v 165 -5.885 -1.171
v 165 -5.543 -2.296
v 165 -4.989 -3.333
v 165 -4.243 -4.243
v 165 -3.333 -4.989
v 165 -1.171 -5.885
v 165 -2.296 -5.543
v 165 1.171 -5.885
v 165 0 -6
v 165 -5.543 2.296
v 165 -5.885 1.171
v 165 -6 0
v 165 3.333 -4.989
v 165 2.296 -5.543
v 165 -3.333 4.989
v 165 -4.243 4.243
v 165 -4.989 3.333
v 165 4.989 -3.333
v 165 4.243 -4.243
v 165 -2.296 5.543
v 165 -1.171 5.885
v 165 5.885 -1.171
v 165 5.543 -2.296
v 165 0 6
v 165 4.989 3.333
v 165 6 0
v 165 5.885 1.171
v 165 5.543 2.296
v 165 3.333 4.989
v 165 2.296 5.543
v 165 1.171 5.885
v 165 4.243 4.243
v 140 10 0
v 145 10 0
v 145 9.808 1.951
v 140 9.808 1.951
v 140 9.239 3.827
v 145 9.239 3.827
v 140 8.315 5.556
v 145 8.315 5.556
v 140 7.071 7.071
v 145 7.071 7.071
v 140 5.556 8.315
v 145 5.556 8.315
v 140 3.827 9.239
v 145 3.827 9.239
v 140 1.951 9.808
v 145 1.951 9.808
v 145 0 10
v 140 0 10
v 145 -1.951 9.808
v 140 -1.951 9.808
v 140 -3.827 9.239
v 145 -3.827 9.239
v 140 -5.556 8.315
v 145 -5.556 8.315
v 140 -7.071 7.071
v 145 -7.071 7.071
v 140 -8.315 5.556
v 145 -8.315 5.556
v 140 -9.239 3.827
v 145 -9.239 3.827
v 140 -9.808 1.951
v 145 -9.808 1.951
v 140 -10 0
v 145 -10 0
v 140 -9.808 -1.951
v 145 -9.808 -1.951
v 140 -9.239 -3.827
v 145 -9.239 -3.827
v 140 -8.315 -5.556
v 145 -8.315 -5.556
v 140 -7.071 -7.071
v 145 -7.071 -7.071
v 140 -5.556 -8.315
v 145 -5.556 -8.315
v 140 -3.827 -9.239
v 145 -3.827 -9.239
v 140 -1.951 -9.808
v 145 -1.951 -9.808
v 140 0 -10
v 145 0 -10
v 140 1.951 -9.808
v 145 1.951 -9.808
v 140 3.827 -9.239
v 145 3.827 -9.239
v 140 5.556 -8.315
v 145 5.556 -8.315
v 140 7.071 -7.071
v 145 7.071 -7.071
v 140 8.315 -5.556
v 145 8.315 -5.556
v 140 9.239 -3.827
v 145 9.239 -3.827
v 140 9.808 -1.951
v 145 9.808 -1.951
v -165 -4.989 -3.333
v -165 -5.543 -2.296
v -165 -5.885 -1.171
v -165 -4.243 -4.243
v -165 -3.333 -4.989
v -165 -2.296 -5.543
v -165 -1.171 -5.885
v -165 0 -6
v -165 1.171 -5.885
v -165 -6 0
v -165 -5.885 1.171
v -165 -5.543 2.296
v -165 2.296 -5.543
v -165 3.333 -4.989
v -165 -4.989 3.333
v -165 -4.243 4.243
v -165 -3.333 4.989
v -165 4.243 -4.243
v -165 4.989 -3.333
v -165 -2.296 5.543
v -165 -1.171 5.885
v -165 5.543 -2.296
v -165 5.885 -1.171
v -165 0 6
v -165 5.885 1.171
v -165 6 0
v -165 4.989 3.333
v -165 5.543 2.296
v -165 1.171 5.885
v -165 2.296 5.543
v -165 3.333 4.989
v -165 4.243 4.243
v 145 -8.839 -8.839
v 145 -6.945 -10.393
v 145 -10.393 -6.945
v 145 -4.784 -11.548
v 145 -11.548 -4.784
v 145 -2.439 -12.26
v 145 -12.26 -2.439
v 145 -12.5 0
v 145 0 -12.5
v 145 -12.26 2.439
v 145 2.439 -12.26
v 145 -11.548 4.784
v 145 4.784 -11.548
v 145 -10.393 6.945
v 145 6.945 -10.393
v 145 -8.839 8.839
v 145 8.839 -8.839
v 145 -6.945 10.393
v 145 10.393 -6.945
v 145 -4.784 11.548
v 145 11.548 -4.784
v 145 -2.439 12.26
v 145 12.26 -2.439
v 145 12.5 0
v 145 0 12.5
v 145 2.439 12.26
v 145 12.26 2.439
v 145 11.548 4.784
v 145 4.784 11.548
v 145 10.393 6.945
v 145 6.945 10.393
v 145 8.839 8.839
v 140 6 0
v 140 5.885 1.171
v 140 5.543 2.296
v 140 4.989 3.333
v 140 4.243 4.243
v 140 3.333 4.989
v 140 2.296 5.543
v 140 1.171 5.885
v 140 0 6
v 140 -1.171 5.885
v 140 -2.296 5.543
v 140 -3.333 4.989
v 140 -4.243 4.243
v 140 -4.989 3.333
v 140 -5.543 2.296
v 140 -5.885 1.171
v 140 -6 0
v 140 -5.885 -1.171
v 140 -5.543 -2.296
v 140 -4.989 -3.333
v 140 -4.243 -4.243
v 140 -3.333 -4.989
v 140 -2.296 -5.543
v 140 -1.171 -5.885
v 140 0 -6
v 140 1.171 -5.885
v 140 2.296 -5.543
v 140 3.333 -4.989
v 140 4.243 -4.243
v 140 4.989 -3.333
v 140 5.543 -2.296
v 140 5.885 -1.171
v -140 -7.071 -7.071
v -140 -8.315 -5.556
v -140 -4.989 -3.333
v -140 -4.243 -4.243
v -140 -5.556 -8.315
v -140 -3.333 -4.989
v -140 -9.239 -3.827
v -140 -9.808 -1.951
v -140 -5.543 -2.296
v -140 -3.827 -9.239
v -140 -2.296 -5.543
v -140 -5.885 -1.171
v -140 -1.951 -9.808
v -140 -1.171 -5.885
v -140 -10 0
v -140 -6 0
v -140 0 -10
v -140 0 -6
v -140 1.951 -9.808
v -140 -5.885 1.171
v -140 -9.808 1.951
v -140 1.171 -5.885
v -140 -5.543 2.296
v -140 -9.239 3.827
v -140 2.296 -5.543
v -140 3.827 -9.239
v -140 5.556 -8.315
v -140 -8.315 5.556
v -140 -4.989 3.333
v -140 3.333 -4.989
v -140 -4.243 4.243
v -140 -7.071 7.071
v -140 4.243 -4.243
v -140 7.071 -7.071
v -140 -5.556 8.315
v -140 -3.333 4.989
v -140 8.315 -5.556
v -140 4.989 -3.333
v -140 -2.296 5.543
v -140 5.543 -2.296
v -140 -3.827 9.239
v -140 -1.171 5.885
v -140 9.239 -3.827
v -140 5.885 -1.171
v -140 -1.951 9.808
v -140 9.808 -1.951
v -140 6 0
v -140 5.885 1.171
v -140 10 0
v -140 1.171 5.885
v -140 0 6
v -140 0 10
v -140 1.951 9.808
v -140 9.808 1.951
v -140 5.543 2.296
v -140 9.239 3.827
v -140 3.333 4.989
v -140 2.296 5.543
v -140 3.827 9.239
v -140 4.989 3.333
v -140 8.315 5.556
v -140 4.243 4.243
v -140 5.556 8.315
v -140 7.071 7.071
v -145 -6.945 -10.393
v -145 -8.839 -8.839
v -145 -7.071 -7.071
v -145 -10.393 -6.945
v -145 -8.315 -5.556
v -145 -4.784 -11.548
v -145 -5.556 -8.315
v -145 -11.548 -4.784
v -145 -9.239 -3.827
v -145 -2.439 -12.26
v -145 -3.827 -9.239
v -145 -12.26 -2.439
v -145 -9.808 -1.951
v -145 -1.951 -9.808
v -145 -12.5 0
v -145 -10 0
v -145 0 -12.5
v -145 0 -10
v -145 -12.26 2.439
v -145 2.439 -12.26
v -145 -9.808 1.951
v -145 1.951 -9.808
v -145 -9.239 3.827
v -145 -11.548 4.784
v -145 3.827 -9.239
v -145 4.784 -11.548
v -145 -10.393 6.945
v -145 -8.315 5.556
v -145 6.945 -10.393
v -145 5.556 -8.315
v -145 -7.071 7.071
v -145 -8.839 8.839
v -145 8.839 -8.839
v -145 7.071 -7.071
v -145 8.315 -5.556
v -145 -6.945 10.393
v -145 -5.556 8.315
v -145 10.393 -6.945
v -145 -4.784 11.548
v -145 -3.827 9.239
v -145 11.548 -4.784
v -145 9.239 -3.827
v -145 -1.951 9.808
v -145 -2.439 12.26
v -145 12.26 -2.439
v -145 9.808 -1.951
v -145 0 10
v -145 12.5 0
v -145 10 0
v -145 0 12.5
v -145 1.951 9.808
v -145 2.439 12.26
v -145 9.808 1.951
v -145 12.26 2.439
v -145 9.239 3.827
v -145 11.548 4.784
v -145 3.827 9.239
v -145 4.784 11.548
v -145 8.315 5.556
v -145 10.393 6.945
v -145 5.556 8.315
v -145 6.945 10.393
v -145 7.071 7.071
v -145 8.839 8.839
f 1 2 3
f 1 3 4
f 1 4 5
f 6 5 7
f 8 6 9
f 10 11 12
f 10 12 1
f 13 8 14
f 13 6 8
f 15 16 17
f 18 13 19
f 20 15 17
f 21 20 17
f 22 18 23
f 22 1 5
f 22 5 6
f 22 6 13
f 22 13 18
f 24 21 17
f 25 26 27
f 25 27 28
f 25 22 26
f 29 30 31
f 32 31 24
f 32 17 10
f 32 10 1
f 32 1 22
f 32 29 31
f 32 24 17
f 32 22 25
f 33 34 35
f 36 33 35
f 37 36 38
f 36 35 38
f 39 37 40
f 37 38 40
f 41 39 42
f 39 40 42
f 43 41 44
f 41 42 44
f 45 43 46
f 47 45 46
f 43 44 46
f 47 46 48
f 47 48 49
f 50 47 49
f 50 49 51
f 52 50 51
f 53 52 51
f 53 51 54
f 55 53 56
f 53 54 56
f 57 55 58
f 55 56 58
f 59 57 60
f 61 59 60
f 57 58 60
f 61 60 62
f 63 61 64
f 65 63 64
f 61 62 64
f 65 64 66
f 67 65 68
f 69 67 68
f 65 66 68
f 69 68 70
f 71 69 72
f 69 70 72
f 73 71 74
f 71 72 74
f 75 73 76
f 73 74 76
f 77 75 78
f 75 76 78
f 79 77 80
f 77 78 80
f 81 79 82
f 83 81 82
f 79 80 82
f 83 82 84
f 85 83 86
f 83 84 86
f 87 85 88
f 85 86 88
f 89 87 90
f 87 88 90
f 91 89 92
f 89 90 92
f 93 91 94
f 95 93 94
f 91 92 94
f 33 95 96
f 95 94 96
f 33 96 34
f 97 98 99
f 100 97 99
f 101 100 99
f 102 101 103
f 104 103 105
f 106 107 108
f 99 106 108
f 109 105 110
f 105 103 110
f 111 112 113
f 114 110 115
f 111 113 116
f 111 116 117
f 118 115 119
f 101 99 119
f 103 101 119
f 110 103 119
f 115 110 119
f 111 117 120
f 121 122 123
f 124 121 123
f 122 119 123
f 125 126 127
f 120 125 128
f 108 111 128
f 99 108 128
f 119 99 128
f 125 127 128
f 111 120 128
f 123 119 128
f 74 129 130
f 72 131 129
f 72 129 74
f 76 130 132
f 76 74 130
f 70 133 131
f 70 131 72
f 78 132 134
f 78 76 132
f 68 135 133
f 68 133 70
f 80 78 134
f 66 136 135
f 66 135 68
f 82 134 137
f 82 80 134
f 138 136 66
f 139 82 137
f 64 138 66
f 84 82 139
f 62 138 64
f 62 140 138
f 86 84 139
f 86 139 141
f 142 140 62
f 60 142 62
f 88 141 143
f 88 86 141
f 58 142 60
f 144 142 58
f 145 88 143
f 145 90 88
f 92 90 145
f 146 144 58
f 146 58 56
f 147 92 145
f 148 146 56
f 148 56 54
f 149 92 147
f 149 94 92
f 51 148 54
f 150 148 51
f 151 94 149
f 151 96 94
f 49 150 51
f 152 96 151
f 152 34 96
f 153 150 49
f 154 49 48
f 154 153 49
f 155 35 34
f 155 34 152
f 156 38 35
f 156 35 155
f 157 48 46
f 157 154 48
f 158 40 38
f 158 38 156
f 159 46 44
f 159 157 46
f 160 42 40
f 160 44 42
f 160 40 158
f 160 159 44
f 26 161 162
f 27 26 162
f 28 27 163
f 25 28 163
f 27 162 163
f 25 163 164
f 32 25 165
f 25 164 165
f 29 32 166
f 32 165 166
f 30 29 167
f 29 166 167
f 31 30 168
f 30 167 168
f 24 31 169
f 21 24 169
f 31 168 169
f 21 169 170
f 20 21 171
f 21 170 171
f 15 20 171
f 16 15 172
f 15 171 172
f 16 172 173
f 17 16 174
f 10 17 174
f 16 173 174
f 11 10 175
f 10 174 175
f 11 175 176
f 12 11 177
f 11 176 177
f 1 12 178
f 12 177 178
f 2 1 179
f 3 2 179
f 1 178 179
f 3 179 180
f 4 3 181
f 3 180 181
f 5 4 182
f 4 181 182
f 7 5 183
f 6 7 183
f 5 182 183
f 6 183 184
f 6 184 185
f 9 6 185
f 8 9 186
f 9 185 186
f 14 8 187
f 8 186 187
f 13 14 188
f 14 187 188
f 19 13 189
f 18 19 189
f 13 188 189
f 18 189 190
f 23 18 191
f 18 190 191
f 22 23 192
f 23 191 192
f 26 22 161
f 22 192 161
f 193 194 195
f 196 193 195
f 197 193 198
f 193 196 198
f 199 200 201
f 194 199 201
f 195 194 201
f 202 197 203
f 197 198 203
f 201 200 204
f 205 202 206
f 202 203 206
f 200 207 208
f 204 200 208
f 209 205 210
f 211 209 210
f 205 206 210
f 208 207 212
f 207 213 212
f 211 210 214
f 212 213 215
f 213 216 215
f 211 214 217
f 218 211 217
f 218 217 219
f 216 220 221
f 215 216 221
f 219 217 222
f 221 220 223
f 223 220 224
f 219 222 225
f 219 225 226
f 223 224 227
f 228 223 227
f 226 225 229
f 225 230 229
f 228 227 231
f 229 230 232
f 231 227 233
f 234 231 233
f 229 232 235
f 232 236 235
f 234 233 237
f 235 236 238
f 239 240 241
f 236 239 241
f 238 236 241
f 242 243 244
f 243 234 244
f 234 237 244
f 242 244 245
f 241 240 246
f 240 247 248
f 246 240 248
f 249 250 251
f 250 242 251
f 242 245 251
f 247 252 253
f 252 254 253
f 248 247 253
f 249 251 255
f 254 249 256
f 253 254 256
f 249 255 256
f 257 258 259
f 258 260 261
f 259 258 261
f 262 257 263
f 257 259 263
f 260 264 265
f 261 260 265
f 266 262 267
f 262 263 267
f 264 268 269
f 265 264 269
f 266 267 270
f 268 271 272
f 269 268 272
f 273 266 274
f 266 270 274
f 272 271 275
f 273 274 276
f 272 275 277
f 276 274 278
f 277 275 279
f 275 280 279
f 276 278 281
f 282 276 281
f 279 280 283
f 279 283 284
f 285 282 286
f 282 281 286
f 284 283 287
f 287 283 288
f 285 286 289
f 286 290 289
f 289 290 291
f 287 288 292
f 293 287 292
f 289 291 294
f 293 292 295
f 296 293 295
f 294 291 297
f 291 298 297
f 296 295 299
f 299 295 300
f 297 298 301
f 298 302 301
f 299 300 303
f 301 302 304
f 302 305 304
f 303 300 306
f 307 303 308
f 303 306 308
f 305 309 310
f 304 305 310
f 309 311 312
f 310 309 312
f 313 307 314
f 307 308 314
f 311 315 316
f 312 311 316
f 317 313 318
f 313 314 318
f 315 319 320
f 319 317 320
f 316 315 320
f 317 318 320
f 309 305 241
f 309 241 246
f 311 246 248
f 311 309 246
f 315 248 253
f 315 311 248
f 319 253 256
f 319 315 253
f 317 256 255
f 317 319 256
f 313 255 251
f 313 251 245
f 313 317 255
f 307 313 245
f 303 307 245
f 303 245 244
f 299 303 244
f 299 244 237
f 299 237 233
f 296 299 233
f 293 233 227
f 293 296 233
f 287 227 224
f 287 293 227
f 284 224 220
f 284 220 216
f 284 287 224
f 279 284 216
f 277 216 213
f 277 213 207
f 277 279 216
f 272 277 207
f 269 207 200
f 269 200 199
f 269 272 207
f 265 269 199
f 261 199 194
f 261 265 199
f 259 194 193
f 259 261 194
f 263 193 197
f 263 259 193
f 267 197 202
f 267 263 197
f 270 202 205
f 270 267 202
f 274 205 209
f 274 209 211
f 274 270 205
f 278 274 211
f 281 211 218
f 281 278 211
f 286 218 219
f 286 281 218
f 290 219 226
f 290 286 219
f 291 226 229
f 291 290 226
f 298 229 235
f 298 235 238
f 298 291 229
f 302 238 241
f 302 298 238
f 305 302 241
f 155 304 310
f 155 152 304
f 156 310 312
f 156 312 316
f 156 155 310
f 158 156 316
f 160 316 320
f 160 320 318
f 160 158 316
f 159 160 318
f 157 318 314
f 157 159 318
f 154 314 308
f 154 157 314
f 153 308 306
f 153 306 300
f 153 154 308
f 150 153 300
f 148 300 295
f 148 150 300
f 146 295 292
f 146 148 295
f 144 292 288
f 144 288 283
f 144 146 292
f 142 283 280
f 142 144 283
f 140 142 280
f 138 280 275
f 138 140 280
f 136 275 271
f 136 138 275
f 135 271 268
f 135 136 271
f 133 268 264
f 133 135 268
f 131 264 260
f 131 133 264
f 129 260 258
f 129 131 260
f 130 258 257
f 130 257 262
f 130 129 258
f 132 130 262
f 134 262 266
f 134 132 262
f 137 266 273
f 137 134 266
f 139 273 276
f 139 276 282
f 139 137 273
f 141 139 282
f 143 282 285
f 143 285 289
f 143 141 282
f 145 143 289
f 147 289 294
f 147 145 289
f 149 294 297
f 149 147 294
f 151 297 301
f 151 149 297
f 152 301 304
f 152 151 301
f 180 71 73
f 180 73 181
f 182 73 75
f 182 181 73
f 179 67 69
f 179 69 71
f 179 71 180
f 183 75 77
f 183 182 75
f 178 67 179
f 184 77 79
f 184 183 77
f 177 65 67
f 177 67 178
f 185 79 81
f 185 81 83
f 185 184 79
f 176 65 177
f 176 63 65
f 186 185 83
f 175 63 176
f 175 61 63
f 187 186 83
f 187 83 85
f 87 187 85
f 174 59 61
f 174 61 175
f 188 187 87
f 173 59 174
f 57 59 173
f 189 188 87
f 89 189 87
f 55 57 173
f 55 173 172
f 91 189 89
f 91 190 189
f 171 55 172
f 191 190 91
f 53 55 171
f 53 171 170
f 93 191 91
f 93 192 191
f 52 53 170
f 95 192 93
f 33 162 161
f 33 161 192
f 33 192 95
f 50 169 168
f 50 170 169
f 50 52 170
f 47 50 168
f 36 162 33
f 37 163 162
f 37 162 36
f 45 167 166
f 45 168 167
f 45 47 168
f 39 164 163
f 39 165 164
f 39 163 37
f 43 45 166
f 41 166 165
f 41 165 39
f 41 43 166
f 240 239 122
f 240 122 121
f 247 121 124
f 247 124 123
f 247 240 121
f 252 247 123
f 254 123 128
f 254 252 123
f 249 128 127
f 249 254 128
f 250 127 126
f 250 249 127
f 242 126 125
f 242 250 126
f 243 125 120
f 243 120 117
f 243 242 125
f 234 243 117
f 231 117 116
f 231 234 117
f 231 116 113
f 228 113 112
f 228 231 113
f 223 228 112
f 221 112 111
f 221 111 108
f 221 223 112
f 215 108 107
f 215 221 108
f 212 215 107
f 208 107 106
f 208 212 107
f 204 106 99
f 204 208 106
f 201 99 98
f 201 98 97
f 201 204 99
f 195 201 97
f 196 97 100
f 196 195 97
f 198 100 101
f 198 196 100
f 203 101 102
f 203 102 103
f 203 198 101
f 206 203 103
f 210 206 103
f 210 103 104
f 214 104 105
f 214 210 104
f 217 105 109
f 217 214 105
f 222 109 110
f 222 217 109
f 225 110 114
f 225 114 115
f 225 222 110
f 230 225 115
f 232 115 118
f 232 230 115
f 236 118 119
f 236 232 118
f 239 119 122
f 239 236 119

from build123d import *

# Parameters (mm, degrees)
SKETCH_R     = 12.5
PAD_DEPTH    = 145
SKETCH001_R  = 10
POCKET_DEPTH = 5
SKETCH002_R  = 6
PAD001_DEPTH = 25


with BuildPart() as part:
    # Sketch → Pad (new body, symmetric)
    with BuildSketch(Plane.YZ):
        Circle(SKETCH_R)
    extrude(amount=PAD_DEPTH, both=True)

    # Sketch001 (on Face3 of Pad) → Pocket (cut)
    with BuildSketch(Plane.YZ.offset(145)):
        Circle(SKETCH001_R)
    pocket = extrude(amount=-POCKET_DEPTH, mode=Mode.SUBTRACT)

    # Sketch002 (on Face5 of Pocket) → Pad001 (join)
    with BuildSketch(Plane.YZ.offset(140)):
        Circle(SKETCH002_R)
    pad001 = extrude(amount=PAD001_DEPTH)

    # Mirrored: Pocket, Pad001 across YZ
    add(pocket.mirror(Plane.YZ), mode=Mode.SUBTRACT)
    add(pad001.mirror(Plane.YZ))


solid = part.part
